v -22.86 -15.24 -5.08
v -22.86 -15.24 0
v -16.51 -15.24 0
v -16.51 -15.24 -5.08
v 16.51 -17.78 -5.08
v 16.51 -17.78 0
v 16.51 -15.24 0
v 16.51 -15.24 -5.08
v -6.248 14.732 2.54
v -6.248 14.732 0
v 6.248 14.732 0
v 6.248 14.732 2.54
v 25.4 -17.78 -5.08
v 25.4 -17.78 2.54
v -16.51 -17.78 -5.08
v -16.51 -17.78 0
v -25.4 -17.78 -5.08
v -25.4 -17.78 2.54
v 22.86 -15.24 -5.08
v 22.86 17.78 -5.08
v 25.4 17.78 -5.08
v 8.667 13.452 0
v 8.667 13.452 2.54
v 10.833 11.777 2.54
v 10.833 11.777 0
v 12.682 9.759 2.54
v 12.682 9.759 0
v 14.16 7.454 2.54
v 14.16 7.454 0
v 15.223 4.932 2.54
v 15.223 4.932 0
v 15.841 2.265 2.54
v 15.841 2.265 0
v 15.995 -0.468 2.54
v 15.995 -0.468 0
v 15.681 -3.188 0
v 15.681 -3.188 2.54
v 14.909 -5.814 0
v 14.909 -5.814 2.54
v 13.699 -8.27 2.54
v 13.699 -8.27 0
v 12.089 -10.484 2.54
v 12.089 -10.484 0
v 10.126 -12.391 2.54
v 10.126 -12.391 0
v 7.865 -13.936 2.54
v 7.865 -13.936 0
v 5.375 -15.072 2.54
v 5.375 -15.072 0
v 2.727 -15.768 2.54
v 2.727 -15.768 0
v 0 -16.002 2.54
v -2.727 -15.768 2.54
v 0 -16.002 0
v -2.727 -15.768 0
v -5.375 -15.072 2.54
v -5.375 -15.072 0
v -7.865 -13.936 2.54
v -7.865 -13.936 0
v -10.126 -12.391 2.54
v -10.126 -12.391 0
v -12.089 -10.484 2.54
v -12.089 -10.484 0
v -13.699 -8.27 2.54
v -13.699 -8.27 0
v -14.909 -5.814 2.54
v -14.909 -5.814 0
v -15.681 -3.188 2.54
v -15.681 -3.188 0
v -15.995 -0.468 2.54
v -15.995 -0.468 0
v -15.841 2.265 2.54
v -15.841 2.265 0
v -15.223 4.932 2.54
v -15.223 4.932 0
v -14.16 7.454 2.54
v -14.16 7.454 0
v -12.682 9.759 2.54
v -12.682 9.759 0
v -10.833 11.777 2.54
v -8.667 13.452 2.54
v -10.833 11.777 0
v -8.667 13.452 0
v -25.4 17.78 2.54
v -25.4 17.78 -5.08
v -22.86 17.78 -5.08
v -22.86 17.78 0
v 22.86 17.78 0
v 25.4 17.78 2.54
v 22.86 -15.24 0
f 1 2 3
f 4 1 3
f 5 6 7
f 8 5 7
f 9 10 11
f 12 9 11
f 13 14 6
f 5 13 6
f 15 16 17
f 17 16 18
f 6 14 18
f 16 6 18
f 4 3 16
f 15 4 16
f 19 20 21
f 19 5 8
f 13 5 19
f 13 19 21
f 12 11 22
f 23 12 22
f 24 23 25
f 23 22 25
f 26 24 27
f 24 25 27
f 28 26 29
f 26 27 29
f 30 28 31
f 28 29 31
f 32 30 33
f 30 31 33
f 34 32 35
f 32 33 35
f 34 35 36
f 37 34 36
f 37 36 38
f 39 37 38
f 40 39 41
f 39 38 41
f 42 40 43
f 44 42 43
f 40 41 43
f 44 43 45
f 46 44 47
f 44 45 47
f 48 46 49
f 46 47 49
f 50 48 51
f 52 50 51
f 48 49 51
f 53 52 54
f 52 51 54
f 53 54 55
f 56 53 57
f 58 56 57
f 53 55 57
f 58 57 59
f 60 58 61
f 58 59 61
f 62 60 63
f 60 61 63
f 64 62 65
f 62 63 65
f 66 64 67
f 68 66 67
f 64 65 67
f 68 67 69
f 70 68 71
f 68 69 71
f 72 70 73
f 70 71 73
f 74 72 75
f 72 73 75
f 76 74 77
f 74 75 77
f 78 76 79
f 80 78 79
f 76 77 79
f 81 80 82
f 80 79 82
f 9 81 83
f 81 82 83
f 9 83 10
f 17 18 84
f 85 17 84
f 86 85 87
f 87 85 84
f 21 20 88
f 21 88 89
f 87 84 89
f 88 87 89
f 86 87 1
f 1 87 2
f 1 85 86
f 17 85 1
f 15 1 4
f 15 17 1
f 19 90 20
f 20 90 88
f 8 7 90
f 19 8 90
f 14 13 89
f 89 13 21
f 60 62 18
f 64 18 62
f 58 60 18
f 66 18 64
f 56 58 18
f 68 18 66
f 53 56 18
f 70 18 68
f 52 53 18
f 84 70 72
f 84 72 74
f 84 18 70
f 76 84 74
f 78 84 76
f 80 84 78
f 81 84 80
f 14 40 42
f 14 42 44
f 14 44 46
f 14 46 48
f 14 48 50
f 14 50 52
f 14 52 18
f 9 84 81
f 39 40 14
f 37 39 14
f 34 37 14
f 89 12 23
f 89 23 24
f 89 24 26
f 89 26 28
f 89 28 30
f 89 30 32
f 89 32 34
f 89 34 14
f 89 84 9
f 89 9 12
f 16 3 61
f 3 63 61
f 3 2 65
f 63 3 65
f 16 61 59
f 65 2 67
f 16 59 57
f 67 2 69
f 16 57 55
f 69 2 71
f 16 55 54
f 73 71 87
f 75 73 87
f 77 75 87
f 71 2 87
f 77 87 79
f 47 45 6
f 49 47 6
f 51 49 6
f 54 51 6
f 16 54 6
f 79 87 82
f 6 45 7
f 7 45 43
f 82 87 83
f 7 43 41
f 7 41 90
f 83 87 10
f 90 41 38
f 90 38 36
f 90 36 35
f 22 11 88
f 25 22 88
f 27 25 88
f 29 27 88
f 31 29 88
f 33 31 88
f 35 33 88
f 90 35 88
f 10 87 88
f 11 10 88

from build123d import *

# Parameters (mm, degrees)
F0_W     = 50.8
F0_H     = 35.56
F1_DEPTH = 2.54
F3_DEPTH = 5.08


with BuildPart() as f1:
    # F0 (on Top) → F1 (new body)
    with BuildSketch(Plane.XY):
        Rectangle(F0_W, F0_H)
        with BuildLine():
            ThreePointArc((6.247574, 14.732), (0, -16.002), (-6.247574, 14.732))
            Line((-6.247574, 14.732), (6.247574, 14.732))
        make_face(mode=Mode.SUBTRACT)
    extrude(amount=F1_DEPTH)

    # F2 (on face) → F3 (join)
    with BuildSketch(Plane(origin=(0, 0, 0), x_dir=(1, 0, 0), z_dir=(0, 0, -1))):
        Polygon((-25.4, -17.78), (-22.86, -17.78), (-22.86, 15.24), (-16.51, 15.24), (-16.51, 17.78), (-25.4, 17.78), align=None)
        Polygon((22.86, -17.78), (25.4, -17.78), (25.4, 17.78), (16.51, 17.78), (16.51, 15.24), (22.86, 15.24), align=None)
    extrude(amount=F3_DEPTH)


solid = f1.part
